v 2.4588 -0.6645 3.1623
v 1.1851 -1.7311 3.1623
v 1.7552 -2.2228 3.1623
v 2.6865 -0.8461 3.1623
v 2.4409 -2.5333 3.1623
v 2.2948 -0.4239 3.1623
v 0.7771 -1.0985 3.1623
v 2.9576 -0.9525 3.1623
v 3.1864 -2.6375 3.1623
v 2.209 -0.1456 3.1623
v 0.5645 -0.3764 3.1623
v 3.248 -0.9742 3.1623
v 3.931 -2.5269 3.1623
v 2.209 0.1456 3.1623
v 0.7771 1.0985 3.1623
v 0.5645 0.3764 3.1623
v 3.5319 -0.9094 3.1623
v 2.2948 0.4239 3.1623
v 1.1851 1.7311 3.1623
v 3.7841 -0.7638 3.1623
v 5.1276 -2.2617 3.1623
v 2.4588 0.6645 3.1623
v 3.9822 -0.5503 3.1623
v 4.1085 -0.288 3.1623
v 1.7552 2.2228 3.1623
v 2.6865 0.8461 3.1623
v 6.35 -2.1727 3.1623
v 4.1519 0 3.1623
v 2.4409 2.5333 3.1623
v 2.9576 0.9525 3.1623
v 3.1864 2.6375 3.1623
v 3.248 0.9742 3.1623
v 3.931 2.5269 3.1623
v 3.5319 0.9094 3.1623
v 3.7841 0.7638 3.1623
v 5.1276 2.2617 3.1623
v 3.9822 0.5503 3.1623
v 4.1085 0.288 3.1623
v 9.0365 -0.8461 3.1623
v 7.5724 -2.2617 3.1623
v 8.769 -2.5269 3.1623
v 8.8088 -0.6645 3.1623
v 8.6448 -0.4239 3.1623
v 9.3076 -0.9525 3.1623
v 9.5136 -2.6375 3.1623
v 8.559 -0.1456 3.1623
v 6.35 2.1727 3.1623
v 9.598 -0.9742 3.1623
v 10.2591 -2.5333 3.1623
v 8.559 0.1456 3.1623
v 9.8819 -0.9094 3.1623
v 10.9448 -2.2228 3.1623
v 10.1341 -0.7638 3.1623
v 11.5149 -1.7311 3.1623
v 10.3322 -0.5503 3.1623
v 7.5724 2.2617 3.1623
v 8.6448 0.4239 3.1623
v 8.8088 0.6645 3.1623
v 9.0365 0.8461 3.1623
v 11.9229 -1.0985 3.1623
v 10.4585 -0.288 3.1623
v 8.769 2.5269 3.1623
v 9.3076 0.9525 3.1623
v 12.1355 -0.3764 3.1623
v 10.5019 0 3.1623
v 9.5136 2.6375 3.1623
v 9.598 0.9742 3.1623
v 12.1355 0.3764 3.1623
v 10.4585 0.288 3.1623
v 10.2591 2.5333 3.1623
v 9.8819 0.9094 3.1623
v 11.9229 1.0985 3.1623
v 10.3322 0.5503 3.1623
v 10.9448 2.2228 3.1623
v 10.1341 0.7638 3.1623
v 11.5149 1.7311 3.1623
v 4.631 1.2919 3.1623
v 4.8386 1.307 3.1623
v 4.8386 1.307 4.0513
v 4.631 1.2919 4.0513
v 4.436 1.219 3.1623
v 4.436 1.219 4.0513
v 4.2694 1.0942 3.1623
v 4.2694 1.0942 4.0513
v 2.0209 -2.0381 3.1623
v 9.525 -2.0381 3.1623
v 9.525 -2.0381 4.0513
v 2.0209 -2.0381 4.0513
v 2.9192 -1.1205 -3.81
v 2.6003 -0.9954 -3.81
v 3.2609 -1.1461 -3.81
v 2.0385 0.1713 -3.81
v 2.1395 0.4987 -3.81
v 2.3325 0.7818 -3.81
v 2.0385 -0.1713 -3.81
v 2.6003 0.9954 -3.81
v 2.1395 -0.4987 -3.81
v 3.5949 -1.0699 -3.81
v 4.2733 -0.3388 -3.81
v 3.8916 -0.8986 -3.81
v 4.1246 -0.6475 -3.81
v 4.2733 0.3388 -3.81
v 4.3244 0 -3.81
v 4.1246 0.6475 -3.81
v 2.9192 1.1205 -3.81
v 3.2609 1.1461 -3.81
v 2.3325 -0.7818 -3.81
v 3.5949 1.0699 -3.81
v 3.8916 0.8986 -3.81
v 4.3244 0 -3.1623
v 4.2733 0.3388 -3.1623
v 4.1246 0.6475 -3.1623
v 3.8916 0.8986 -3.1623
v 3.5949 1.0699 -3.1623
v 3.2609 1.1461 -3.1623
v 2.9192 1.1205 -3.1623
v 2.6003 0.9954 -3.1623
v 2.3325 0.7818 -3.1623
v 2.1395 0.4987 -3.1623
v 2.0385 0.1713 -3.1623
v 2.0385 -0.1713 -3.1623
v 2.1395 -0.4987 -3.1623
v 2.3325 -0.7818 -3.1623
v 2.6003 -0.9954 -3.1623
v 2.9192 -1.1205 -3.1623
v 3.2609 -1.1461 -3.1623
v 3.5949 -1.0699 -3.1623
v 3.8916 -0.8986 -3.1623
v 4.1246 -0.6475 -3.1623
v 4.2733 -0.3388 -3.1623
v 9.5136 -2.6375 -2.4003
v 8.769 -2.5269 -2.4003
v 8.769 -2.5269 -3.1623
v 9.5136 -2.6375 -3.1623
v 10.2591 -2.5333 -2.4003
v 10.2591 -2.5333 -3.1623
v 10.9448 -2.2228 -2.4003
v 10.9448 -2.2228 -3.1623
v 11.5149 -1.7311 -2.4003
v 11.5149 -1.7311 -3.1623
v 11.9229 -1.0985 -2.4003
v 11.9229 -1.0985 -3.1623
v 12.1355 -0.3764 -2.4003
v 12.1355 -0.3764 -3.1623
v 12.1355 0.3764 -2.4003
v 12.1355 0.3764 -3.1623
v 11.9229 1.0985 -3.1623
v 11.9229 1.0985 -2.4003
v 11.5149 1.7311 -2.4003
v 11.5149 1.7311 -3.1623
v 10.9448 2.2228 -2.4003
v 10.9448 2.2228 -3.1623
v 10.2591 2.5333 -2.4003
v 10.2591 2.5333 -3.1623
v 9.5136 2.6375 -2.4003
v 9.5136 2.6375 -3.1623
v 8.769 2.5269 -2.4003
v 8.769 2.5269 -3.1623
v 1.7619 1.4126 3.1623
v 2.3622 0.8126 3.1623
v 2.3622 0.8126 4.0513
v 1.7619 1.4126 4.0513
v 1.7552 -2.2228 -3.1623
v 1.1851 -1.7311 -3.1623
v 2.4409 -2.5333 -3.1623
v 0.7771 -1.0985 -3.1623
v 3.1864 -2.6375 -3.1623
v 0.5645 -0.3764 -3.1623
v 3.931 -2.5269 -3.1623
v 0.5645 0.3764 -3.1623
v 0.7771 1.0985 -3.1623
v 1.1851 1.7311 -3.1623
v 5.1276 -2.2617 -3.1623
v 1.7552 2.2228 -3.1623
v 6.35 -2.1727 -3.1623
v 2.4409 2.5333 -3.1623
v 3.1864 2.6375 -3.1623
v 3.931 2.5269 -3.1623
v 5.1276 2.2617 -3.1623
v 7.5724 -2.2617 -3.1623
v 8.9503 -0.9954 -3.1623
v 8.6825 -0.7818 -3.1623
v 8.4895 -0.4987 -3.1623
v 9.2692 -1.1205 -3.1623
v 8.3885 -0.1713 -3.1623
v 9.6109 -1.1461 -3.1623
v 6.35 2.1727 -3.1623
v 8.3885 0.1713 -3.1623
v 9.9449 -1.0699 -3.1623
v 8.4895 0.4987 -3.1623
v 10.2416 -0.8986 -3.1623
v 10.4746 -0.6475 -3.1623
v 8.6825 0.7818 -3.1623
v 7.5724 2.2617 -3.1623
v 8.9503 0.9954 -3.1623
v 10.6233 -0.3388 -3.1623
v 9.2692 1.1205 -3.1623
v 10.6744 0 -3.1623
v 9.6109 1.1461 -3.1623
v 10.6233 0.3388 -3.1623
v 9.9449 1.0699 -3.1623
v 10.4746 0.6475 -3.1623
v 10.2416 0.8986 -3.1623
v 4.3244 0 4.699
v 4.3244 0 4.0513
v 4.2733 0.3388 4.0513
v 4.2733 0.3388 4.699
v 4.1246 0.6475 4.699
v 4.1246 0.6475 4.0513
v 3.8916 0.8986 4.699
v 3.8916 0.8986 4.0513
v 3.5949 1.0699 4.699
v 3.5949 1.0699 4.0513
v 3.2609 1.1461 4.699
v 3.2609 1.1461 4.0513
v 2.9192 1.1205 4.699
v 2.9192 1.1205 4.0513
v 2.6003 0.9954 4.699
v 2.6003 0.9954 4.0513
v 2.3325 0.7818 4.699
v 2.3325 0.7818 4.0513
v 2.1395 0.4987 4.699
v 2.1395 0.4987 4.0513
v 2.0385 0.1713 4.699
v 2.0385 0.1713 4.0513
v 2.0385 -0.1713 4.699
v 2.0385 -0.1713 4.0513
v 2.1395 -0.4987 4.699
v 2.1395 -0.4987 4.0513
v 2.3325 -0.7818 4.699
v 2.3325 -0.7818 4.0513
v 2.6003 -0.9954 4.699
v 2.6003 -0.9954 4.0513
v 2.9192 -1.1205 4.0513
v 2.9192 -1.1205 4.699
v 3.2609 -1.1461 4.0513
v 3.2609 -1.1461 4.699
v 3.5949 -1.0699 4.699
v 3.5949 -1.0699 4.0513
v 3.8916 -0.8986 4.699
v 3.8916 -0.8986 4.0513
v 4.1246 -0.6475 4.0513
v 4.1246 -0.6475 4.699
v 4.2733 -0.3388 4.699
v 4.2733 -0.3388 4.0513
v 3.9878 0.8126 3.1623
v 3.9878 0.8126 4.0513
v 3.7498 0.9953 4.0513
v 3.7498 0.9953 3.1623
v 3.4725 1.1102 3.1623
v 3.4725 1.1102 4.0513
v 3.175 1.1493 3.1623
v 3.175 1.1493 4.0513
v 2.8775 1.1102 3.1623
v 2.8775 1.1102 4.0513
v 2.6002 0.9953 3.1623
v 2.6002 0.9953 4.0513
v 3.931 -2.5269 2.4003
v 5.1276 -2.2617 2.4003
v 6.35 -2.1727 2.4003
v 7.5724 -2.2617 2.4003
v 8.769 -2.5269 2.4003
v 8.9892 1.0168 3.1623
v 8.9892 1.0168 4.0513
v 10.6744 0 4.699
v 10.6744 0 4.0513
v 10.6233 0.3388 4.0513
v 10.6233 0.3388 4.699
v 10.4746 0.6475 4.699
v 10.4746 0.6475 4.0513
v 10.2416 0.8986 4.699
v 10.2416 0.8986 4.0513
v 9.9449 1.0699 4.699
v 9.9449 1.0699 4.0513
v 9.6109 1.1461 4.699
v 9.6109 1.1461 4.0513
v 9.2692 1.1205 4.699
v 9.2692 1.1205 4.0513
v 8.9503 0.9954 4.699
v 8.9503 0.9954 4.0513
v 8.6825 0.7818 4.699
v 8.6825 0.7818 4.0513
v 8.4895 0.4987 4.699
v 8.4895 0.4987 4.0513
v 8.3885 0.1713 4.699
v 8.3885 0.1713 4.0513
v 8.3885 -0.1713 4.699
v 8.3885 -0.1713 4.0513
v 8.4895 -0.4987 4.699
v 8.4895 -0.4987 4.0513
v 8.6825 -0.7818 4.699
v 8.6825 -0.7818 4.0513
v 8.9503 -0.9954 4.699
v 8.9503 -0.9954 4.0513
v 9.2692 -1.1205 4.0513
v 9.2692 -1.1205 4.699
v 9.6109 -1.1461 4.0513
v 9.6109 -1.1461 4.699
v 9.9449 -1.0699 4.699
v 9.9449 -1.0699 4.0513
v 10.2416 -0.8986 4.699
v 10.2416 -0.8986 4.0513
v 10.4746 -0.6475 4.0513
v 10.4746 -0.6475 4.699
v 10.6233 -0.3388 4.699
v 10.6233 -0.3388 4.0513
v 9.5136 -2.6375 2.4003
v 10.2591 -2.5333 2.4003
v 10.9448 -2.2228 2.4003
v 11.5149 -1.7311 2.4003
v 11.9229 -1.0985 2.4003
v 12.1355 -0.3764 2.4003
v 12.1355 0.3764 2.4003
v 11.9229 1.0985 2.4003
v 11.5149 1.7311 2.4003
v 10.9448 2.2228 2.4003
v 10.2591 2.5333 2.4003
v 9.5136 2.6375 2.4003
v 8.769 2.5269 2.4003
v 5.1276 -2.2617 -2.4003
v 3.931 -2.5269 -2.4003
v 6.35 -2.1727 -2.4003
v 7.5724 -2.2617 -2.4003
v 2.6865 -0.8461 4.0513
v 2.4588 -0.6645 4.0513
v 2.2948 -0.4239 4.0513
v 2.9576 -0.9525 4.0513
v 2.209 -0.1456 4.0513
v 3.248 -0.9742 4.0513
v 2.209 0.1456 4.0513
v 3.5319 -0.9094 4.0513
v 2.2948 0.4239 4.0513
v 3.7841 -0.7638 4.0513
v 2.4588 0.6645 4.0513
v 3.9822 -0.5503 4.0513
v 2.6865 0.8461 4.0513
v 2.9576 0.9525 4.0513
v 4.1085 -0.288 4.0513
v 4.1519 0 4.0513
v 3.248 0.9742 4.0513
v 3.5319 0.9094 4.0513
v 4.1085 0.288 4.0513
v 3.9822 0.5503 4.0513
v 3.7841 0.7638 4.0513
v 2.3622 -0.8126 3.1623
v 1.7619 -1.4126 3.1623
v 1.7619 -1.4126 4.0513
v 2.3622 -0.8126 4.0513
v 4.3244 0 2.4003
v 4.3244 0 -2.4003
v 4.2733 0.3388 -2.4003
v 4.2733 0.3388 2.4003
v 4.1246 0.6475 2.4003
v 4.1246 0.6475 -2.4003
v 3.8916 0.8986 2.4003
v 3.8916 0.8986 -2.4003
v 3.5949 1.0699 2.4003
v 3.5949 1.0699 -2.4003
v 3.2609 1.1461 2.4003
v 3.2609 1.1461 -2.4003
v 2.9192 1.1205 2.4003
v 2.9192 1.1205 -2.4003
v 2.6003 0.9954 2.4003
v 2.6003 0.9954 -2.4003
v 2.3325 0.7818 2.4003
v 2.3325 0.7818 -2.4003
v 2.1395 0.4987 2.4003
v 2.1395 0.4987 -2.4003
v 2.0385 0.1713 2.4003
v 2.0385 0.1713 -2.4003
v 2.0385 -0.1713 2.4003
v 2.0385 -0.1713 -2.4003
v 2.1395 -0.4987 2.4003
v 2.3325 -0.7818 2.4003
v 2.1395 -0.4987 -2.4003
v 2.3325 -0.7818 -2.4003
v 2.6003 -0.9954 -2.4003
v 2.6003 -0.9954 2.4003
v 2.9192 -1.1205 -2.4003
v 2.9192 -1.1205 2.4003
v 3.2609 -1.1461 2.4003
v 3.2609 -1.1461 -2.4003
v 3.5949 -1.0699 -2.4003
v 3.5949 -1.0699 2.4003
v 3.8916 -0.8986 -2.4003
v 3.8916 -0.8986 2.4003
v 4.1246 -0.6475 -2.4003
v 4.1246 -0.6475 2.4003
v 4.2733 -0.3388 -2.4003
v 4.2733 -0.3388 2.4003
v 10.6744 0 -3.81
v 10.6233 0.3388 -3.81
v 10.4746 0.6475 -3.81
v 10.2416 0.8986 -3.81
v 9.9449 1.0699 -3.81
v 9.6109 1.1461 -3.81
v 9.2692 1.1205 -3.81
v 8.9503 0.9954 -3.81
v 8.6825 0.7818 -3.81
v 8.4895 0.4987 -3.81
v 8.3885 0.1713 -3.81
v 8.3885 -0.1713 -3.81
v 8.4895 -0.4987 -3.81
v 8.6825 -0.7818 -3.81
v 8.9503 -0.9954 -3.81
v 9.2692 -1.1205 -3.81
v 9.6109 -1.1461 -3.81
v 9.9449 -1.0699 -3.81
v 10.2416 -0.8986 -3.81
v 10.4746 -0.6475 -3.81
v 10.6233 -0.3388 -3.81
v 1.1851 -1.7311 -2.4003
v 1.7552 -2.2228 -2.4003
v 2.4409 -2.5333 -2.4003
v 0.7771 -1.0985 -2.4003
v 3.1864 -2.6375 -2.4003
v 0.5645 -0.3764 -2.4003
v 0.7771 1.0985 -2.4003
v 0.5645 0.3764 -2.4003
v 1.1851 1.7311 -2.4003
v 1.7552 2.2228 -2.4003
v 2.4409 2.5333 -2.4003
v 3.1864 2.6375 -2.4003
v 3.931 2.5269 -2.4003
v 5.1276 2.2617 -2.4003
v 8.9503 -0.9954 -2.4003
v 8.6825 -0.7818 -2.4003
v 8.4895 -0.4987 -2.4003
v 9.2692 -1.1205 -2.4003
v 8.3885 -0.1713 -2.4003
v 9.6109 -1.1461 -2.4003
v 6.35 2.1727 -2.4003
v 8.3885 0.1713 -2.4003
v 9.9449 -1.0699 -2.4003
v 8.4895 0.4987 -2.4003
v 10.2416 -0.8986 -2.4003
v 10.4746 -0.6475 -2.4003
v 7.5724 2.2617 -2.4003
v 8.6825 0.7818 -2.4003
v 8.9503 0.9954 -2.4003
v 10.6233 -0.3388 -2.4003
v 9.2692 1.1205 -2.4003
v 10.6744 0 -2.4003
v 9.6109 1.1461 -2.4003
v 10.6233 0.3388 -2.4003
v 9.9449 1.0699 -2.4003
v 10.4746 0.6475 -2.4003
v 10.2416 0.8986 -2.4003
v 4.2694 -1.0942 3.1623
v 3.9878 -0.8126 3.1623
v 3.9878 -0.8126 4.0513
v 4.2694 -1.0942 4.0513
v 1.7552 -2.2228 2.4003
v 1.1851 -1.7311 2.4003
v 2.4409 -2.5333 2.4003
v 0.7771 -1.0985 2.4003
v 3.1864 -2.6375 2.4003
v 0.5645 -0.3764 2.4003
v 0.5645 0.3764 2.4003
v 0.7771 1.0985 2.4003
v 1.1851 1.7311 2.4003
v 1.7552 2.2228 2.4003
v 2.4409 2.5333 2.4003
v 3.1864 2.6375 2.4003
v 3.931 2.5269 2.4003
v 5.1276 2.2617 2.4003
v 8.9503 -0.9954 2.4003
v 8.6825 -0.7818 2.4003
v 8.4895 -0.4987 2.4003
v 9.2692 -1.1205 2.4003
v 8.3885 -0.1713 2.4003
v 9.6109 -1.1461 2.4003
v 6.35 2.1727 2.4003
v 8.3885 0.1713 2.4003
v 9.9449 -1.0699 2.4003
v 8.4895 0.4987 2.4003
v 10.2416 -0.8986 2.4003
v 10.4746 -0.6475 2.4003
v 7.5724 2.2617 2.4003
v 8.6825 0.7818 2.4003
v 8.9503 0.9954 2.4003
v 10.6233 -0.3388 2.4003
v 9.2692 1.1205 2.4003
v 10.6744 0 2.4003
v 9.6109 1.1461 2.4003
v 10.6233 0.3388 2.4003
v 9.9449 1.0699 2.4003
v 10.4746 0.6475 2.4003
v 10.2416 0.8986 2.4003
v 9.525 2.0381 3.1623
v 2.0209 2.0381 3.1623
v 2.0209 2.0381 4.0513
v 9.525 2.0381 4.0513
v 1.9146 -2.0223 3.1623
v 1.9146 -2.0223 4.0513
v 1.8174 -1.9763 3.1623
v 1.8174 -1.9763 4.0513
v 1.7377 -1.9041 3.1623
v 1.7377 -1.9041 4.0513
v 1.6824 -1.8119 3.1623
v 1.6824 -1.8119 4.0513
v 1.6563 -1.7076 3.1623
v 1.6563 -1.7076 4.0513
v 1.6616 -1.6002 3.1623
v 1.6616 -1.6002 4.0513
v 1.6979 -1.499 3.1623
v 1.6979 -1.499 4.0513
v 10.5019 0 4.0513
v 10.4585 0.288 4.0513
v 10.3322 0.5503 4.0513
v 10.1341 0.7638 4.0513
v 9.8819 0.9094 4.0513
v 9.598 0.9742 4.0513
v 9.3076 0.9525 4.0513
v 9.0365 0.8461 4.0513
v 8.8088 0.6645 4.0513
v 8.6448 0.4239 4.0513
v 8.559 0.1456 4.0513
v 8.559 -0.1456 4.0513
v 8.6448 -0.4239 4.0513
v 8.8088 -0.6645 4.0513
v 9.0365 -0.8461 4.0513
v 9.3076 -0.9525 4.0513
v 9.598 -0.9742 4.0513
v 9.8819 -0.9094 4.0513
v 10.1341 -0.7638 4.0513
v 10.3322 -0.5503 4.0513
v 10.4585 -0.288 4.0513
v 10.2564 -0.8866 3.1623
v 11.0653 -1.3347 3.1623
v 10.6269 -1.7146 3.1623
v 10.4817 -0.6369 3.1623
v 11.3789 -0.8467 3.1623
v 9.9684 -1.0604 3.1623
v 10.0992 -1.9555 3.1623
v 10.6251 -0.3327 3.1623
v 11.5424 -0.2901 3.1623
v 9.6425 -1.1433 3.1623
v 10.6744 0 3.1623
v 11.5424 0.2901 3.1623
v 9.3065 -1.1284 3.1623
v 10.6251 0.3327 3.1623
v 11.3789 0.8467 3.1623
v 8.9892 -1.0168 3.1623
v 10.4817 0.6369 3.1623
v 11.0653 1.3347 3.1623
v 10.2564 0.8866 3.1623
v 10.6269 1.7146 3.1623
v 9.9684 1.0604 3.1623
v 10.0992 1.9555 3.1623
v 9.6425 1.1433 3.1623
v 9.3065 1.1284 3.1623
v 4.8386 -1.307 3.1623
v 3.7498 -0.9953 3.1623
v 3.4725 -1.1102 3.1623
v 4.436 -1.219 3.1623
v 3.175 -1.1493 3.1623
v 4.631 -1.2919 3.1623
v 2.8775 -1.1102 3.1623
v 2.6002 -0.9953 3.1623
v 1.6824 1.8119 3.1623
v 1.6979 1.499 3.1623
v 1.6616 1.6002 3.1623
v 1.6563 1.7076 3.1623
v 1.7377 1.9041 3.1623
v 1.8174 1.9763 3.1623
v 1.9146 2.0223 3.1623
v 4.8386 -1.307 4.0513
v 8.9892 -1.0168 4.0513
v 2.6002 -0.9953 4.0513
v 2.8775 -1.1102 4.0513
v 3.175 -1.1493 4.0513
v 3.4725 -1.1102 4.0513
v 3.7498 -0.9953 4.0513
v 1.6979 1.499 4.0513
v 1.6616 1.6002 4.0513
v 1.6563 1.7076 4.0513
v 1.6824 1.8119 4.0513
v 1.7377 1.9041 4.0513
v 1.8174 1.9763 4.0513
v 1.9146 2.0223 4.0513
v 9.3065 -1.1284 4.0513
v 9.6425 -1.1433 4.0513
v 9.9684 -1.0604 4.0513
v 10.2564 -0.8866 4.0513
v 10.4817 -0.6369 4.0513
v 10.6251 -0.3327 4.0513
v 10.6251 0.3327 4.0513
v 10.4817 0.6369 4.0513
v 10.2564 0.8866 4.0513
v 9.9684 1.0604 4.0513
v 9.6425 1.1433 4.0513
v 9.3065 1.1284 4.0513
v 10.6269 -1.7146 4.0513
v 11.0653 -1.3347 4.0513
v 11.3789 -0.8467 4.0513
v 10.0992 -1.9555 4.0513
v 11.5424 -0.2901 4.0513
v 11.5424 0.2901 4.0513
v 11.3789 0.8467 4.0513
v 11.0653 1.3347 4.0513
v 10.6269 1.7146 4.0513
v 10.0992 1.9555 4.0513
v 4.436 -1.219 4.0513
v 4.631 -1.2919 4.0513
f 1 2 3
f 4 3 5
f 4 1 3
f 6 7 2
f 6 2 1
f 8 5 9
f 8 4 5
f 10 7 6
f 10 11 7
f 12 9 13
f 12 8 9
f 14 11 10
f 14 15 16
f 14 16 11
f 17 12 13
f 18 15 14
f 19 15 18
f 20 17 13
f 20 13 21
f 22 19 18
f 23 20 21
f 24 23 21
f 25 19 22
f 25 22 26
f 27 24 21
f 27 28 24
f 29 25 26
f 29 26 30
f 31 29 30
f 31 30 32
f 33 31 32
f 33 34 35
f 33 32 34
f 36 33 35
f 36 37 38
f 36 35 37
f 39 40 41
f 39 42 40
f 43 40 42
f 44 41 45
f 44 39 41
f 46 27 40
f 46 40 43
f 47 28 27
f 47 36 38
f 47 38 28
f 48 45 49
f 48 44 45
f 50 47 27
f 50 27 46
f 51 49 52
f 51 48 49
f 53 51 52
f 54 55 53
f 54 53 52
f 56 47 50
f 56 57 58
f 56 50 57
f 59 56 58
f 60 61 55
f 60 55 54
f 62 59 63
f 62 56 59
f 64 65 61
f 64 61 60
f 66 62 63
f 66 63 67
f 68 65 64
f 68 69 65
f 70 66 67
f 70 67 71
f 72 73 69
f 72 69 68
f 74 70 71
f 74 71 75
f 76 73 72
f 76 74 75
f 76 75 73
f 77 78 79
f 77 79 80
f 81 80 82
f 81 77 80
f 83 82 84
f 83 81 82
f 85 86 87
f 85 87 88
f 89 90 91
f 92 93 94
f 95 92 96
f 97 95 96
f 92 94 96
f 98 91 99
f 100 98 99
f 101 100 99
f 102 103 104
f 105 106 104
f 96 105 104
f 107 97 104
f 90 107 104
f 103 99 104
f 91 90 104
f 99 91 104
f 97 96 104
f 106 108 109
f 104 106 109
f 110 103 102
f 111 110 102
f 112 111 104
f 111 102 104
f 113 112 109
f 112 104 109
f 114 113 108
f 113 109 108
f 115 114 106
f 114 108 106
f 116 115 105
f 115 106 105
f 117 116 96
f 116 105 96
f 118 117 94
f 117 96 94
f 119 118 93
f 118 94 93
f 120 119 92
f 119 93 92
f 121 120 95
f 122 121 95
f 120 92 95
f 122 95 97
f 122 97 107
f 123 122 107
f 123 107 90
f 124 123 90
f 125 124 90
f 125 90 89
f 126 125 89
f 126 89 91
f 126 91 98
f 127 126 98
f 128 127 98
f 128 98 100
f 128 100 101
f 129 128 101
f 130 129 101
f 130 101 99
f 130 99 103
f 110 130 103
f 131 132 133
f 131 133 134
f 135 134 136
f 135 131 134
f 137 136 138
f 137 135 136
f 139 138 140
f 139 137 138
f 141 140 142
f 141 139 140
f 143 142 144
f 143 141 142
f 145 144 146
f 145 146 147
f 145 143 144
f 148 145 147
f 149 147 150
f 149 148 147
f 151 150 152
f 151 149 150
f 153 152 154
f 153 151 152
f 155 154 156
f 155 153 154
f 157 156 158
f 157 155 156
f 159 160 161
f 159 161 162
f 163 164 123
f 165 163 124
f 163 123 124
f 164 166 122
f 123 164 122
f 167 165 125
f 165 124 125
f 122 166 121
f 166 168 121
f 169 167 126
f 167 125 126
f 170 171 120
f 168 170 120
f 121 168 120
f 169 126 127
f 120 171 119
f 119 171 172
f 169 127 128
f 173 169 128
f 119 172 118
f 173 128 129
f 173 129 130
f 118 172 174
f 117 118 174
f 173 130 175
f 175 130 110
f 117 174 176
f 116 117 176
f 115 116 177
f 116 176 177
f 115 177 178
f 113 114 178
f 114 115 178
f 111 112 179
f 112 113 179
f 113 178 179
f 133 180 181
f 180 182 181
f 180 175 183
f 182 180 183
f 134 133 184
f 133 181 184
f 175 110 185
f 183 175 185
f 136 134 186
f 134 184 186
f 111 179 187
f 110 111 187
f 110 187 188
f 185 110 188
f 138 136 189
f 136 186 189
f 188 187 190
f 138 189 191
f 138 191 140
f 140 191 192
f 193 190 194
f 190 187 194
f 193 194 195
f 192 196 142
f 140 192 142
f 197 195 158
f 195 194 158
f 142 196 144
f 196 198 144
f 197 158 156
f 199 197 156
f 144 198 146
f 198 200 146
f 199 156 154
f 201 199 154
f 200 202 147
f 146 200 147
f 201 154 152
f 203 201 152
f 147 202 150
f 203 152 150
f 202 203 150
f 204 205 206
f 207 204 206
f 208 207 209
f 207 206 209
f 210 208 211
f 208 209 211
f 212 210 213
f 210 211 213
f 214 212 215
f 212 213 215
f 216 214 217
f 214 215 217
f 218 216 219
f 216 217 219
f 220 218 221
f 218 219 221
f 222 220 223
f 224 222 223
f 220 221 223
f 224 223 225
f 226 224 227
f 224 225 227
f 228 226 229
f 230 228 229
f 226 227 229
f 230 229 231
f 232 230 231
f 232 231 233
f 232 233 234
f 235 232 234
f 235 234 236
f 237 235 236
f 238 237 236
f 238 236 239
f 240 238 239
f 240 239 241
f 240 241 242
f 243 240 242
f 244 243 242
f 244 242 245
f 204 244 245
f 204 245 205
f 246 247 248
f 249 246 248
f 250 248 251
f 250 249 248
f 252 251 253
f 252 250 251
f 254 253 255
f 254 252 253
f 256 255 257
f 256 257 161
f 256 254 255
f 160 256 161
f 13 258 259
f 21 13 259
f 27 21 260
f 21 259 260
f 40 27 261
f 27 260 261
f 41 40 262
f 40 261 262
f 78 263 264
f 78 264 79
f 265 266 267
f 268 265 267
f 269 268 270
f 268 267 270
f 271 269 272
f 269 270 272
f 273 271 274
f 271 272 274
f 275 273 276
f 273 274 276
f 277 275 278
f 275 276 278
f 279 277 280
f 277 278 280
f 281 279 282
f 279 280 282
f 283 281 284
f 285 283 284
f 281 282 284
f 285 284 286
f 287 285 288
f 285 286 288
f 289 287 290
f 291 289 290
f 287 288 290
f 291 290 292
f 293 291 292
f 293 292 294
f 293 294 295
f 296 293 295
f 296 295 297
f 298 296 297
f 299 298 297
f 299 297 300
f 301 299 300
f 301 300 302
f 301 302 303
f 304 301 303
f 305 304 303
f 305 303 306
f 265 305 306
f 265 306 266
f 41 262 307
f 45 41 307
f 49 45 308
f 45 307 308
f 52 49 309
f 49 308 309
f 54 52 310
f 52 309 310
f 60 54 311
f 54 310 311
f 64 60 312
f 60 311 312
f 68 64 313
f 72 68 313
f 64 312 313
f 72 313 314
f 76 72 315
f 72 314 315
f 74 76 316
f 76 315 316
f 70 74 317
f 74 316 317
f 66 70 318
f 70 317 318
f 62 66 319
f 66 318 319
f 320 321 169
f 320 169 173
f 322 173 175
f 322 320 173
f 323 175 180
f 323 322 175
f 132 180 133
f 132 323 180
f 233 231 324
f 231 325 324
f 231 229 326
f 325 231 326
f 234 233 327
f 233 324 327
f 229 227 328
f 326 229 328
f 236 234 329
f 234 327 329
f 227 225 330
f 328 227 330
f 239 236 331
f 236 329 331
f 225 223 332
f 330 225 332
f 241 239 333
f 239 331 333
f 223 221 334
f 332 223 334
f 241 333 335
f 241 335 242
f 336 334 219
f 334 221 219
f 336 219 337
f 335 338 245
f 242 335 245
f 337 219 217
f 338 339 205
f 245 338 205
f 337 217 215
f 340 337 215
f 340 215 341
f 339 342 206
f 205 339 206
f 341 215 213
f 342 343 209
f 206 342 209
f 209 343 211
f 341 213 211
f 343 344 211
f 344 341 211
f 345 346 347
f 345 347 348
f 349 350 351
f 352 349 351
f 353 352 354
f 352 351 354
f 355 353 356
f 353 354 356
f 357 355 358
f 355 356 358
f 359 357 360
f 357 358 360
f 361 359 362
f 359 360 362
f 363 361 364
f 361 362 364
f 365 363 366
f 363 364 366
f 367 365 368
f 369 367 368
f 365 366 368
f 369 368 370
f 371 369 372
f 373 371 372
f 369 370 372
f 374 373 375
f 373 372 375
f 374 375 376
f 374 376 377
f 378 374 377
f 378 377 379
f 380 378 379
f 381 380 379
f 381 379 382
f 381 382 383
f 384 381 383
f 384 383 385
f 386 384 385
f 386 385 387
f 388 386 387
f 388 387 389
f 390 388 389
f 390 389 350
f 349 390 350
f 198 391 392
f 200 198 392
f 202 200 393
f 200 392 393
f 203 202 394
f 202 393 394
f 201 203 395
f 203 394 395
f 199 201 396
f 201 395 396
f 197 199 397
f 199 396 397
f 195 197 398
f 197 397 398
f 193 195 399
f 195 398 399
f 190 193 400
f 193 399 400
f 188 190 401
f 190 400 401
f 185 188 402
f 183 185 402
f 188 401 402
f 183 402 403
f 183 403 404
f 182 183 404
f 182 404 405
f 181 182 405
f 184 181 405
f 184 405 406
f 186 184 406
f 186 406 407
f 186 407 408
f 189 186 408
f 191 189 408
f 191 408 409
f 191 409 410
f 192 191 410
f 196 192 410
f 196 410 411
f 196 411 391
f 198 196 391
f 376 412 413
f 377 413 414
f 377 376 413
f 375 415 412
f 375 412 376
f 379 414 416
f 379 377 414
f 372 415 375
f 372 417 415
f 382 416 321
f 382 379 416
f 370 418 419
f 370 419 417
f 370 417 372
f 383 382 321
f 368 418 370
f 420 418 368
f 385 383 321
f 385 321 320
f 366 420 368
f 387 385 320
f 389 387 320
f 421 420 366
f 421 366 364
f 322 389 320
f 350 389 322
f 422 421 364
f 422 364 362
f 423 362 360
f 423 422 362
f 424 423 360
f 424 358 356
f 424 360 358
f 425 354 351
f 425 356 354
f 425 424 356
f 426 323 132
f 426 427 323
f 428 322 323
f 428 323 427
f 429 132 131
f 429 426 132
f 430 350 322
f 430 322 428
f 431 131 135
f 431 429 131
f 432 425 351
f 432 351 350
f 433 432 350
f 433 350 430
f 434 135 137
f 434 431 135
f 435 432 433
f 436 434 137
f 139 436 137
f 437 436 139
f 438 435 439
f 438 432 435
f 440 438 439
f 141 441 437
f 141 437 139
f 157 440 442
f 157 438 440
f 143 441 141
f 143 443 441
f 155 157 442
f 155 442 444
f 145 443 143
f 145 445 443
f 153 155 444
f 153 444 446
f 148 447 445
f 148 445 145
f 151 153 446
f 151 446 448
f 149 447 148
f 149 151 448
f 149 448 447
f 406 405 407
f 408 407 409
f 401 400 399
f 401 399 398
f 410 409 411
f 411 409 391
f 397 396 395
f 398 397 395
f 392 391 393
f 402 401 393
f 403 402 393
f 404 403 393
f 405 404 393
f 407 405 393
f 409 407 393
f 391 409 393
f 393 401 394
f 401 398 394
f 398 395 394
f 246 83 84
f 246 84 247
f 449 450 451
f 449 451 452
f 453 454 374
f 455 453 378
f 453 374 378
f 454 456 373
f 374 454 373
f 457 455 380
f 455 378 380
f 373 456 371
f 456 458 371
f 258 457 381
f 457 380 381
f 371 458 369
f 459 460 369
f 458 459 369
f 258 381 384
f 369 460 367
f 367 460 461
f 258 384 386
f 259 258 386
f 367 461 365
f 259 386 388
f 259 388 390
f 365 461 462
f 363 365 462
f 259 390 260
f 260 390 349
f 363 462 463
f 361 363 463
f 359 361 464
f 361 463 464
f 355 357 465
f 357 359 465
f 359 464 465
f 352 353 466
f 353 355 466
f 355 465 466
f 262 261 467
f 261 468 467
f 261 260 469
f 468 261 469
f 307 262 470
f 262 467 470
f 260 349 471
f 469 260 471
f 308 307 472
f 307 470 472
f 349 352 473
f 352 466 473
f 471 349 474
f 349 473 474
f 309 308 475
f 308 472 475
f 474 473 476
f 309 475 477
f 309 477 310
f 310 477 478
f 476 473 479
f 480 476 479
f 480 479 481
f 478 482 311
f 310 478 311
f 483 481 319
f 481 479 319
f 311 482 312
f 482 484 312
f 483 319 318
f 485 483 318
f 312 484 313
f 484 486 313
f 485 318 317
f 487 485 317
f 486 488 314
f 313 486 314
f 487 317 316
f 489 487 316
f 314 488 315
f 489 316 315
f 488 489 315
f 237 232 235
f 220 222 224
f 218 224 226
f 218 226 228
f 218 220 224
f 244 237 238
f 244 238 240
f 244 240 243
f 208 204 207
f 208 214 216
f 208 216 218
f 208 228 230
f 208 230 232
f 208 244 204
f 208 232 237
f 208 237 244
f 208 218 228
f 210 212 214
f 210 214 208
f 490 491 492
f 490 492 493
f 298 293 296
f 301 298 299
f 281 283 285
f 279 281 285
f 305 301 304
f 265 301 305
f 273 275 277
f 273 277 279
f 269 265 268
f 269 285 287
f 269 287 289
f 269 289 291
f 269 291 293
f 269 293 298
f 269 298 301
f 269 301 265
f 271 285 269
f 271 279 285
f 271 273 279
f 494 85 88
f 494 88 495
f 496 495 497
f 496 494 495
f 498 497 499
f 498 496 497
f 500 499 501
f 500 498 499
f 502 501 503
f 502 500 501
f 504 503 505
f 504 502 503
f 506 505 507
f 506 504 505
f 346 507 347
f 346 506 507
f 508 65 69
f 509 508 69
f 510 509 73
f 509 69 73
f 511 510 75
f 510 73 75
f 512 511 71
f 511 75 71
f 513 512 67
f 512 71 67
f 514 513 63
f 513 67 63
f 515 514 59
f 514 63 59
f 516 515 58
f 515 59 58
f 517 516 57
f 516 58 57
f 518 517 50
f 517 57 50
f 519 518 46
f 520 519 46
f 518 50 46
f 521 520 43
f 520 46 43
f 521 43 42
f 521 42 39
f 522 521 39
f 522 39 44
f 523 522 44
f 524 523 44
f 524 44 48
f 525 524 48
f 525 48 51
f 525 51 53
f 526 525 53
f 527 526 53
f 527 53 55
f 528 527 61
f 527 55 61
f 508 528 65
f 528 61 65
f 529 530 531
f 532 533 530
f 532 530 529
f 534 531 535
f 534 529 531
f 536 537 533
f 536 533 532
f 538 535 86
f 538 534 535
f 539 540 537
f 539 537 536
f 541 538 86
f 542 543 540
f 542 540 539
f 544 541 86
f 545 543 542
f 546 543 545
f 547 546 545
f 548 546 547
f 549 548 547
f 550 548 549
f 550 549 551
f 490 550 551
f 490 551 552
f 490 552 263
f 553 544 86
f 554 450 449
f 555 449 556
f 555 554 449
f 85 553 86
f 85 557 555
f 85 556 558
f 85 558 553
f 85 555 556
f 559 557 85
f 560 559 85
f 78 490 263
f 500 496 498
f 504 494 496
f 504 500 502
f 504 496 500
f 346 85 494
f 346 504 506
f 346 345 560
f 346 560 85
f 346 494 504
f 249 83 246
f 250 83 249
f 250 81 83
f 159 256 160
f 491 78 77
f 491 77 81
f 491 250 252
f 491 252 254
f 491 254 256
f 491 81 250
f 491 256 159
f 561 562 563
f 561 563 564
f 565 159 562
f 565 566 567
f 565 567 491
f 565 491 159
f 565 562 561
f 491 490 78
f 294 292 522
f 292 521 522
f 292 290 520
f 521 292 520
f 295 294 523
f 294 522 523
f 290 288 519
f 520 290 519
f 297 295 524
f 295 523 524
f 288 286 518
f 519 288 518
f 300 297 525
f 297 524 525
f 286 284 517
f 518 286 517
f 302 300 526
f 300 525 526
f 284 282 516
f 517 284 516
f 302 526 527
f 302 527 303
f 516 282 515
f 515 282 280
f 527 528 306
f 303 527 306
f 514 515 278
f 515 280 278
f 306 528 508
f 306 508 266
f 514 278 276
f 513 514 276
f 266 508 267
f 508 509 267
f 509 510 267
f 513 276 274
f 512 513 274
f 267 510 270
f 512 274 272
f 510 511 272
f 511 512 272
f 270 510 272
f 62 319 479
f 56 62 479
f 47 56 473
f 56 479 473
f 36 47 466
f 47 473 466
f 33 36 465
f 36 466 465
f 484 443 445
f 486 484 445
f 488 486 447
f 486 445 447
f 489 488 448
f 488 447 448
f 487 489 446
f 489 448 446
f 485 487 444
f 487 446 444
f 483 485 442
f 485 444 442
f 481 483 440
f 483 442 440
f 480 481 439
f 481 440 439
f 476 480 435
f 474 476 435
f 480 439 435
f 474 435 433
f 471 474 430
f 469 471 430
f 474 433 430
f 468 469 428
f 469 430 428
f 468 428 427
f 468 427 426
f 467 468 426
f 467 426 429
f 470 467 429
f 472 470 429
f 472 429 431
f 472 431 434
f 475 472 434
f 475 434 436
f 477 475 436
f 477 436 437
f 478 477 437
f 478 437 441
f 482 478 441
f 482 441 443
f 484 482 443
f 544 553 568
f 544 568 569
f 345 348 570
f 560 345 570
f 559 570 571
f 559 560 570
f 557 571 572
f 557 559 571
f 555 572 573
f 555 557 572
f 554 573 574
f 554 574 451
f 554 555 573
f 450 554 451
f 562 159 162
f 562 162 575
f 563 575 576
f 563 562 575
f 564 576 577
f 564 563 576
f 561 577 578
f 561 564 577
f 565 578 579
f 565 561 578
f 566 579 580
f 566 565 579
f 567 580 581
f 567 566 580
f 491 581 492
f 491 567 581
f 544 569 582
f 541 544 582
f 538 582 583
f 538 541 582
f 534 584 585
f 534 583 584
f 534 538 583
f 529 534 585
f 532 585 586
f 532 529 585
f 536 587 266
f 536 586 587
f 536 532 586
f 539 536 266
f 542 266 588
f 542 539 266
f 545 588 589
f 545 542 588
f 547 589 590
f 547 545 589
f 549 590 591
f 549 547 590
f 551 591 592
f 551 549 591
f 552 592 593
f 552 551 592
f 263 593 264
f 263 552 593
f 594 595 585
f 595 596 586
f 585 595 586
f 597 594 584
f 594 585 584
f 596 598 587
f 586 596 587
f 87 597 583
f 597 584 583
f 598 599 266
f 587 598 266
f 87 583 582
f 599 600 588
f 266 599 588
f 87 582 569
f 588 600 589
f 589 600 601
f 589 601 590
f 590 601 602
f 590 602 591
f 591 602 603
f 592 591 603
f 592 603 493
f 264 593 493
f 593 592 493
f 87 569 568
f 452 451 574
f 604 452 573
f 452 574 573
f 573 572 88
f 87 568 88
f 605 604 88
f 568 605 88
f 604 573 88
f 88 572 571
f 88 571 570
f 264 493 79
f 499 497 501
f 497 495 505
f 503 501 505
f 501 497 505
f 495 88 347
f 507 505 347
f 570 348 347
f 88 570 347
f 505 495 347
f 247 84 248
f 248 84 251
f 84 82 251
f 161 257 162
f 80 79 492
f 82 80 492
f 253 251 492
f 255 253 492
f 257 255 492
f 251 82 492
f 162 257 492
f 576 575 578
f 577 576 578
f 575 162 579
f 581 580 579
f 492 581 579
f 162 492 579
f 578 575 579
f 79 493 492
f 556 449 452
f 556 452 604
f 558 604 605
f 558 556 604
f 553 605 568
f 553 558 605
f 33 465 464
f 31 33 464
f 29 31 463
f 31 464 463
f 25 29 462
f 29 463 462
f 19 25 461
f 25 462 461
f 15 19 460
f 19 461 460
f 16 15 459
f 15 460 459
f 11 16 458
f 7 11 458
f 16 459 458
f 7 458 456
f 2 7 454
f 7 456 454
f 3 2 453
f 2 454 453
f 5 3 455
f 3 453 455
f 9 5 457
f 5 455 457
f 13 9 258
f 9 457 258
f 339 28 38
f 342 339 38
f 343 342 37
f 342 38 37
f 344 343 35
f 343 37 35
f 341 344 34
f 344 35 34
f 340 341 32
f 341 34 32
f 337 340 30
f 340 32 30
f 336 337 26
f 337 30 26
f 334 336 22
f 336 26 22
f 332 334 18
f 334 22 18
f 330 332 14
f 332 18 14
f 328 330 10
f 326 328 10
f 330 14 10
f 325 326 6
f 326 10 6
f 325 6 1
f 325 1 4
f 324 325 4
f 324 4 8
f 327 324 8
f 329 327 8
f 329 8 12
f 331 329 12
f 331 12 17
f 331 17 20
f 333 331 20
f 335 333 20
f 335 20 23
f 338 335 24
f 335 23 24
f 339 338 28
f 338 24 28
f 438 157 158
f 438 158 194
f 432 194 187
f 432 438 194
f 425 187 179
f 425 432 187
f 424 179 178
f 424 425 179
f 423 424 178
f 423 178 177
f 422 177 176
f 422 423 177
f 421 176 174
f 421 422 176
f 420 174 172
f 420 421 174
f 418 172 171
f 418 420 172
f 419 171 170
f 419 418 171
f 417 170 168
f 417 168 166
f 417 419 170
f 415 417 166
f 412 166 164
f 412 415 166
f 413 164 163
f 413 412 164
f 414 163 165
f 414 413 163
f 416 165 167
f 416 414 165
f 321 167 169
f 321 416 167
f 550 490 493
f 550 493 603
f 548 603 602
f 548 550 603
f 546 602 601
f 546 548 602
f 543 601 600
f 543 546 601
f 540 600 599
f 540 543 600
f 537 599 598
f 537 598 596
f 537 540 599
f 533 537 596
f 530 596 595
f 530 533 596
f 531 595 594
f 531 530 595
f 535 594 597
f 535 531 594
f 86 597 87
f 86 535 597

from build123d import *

# Parameters (mm, degrees)
SKETCH4_R                  = 1.651
SKETCH4_R_2                = 1.17475
BOSS_EXTRUDE1_DEPTH        = 1.5875
SKETCH5_R                  = 1.14935
BOSS_EXTRUDE2_DEPTH        = 0.762
LPATTERN1_COUNT            = 2
LPATTERN1_PITCH            = 6.35
SKETCH7_R                  = 1.14935
BOSS_EXTRUDE3_DEPTH        = 0.762
MIRROR1_START              = 2.4003
MIRROR1_OUTLINE_R          = 1.14935
MIRROR1_DEPTH              = 0.762
BOSS_EXTRUDE4_DEPTH        = 4.699
BOSS_EXTRUDE4_DEPTH_BACK   = 3.81
SKETCH8_R                  = 1.14935
BOSS_EXTRUDE4_2_DEPTH      = 4.699
BOSS_EXTRUDE4_2_DEPTH_BACK = 3.81
BOSS_EXTRUDE5_DEPTH        = 0.889
SKETCH12_R                 = 1.14935
SKETCH12_R_2               = 0.9769475
CUT_EXTRUDE1_DEPTH         = 0.889


# Read off the part's stored shape, not the designer's step: Mirror1
with BuildPart() as part:
    # Sketch4 → Boss-Extrude1 (new, symmetric)
    with BuildSketch(Plane.XY):
        with Locations((3.175, 0)):
            Circle(SKETCH4_R)
        with Locations((3.175, 0)):
            Circle(SKETCH4_R_2, mode=Mode.SUBTRACT)
    extrude(amount=BOSS_EXTRUDE1_DEPTH, both=True)


with BuildPart() as body_2:
    # Sketch5 → Boss-Extrude2 (new body)
    with BuildSketch(Plane.XY.offset(1.5875)):
        with BuildLine():
            ThreePointArc((-2.342877482, 2.879371452), (-6.1722, 0), (-2.342877482, -2.879371452))
            ThreePointArc((-2.342877482, -2.879371452), (0, -2.54762), (2.342877482, -2.879371452))
            ThreePointArc((2.342877482, -2.879371452), (6.1722, 0), (2.342877482, 2.879371452))
            ThreePointArc((2.342877482, 2.879371452), (0, 2.54762), (-2.342877482, 2.879371452))
        make_face()
        with Locations(Location((-3.175, 0, 0), (0, 0, 180))):
            Circle(SKETCH5_R, mode=Mode.SUBTRACT)
        with Locations(Location((3.175, 0, 0), (0, 0, 180))):
            Circle(SKETCH5_R, mode=Mode.SUBTRACT)
    extrude(amount=BOSS_EXTRUDE2_DEPTH)


with BuildPart() as lpattern1_1:
    # LPattern1: pattern copy
    add(part.part.moved(Location(Vector(1, 0, 0) * (1 * LPATTERN1_PITCH))))


with BuildPart() as body_4:
    # Sketch7 → Boss-Extrude3 (new body)
    with BuildSketch(Plane.XY.offset(-2.4003)):
        with BuildLine():
            ThreePointArc((3.931045679, 2.526853989), (0.537464, 0), (3.931045679, -2.526853989))
            ThreePointArc((3.931045679, -2.526853989), (6.35, -2.17272892), (8.768954321, -2.526853989))
            ThreePointArc((8.768954321, -2.526853989), (12.162536, 0), (8.768954321, 2.526853989))
            ThreePointArc((8.768954321, 2.526853989), (6.35, 2.17272892), (3.931045679, 2.526853989))
        make_face()
        with Locations((3.175, 0)):
            Circle(SKETCH7_R, mode=Mode.SUBTRACT)
        with Locations((9.525, 0)):
            Circle(SKETCH7_R, mode=Mode.SUBTRACT)
    extrude(amount=-BOSS_EXTRUDE3_DEPTH)


with BuildPart() as body_5:
    # Mirror1 outline → Mirror1 (new body)
    with BuildSketch(Plane.XY.offset(MIRROR1_START)):
        with BuildLine():
            ThreePointArc((8.768954321, -2.526853989), (12.162536, 0), (8.768954321, 2.526853989))
            ThreePointArc((8.768954321, 2.526853989), (6.35, 2.17272892), (3.931045679, 2.526853989))
            ThreePointArc((3.931045679, 2.526853989), (0.537464, 0), (3.931045679, -2.526853989))
            ThreePointArc((3.931045679, -2.526853989), (6.35, -2.17272892), (8.768954321, -2.526853989))
        make_face()
        with Locations((3.175, 0)):
            Circle(MIRROR1_OUTLINE_R, mode=Mode.SUBTRACT)
        with Locations((9.525, 0)):
            Circle(MIRROR1_OUTLINE_R, mode=Mode.SUBTRACT)
    extrude(amount=MIRROR1_DEPTH)


with BuildPart() as body_3:
    # Sketch8 → Boss-Extrude4 (new, two sides: drawn at the far end of the back side and taken through both)
    with BuildSketch(Plane.XY.offset(-BOSS_EXTRUDE4_DEPTH_BACK)):
        with Locations((3.175, 0)):
            Circle(SKETCH8_R)
    extrude(amount=BOSS_EXTRUDE4_DEPTH + BOSS_EXTRUDE4_DEPTH_BACK)


with BuildPart() as body_4_2:
    # Sketch8 → Boss-Extrude4 2 (new, two sides: drawn at the far end of the back side and taken through both)
    with BuildSketch(Plane.XY.offset(-BOSS_EXTRUDE4_2_DEPTH_BACK)):
        with Locations((9.525, 0)):
            Circle(SKETCH8_R)
    extrude(amount=BOSS_EXTRUDE4_2_DEPTH + BOSS_EXTRUDE4_2_DEPTH_BACK)


with BuildPart() as body_5_2:
    # Sketch10 → Boss-Extrude5 (new body)
    with BuildSketch(Plane.XY.offset(3.1623)):
        with BuildLine():
            Line((9.525, -2.038096), (2.020925445, -2.038096))
            ThreePointArc((2.020925445, -2.038096), (1.682446393, -1.811912533), (1.761913324, -1.412648164))
            Line((1.761913324, -1.412648164), (2.484086603, -0.690698991))
            ThreePointArc((2.484086603, -0.690698991), (3.175, -0.9769475), (3.865913397, -0.690698991))
            Line((3.865913397, -0.690698991), (4.269428301, -1.094213895))
            ThreePointArc((4.269428301, -1.094213895), (4.530932284, -1.262418909), (4.838644263, -1.307035023))
            Line((4.838644263, -1.307035023), (9.593148413, -0.974567705))
            ThreePointArc((9.593148413, -0.974567705), (10.5019475, 0), (9.593148413, 0.974567705))
            Line((9.593148413, 0.974567705), (4.838644263, 1.307035023))
            ThreePointArc((4.838644263, 1.307035023), (4.530932284, 1.262418909), (4.269428301, 1.094213895))
            Line((4.269428301, 1.094213895), (3.865913397, 0.690698991))
            ThreePointArc((3.865913397, 0.690698991), (3.175, 0.9769475), (2.484086603, 0.690698991))
            Line((2.484086603, 0.690698991), (1.761913324, 1.412648164))
            ThreePointArc((1.761913324, 1.412648164), (1.682446393, 1.811912533), (2.020925445, 2.038096))
            Line((2.020925445, 2.038096), (9.525, 2.038096))
            ThreePointArc((9.525, 2.038096), (11.563096, 0), (9.525, -2.038096))
        make_face()
    extrude(amount=BOSS_EXTRUDE5_DEPTH)


with BuildPart() as cut_extrude1_tool:
    # Sketch12 → Cut-Extrude1 (new body)
    # profile 1 of 2: a face of its own
    with BuildSketch(Plane.XY.offset(3.1623)):
        with Locations((3.175, 0)):
            Circle(SKETCH12_R)
        with Locations((3.175, 0)):
            Circle(SKETCH12_R_2, mode=Mode.SUBTRACT)
    # profile 2 of 2: a face of its own
    with BuildSketch(Plane.XY.offset(3.1623)):
        with Locations((9.525, 0)):
            Circle(SKETCH12_R)
        with Locations((9.525, 0)):
            Circle(SKETCH12_R_2, mode=Mode.SUBTRACT)
    extrude(amount=CUT_EXTRUDE1_DEPTH)


with BuildPart() as body_3_1:
    add(body_3.part)

    # Cut-Extrude1: cut by cut_extrude1_tool
    add(cut_extrude1_tool.part, mode=Mode.SUBTRACT)


with BuildPart() as body_4_2_1:
    add(body_4_2.part)

    # Cut-Extrude1: cut by cut_extrude1_tool
    add(cut_extrude1_tool.part, mode=Mode.SUBTRACT)


with BuildPart() as body_5_2_1:
    add(body_5_2.part)

    # Cut-Extrude1: cut by cut_extrude1_tool
    add(cut_extrude1_tool.part, mode=Mode.SUBTRACT)


with BuildPart() as body_4_1:
    add(body_4.part)

    # Combine3: union body 5, body 4 2, body 3
    add(body_5.part)
    add(body_4_2_1.part)
    add(body_3_1.part)


solid = Compound([body_5_2_1.part, body_4_1.part])
